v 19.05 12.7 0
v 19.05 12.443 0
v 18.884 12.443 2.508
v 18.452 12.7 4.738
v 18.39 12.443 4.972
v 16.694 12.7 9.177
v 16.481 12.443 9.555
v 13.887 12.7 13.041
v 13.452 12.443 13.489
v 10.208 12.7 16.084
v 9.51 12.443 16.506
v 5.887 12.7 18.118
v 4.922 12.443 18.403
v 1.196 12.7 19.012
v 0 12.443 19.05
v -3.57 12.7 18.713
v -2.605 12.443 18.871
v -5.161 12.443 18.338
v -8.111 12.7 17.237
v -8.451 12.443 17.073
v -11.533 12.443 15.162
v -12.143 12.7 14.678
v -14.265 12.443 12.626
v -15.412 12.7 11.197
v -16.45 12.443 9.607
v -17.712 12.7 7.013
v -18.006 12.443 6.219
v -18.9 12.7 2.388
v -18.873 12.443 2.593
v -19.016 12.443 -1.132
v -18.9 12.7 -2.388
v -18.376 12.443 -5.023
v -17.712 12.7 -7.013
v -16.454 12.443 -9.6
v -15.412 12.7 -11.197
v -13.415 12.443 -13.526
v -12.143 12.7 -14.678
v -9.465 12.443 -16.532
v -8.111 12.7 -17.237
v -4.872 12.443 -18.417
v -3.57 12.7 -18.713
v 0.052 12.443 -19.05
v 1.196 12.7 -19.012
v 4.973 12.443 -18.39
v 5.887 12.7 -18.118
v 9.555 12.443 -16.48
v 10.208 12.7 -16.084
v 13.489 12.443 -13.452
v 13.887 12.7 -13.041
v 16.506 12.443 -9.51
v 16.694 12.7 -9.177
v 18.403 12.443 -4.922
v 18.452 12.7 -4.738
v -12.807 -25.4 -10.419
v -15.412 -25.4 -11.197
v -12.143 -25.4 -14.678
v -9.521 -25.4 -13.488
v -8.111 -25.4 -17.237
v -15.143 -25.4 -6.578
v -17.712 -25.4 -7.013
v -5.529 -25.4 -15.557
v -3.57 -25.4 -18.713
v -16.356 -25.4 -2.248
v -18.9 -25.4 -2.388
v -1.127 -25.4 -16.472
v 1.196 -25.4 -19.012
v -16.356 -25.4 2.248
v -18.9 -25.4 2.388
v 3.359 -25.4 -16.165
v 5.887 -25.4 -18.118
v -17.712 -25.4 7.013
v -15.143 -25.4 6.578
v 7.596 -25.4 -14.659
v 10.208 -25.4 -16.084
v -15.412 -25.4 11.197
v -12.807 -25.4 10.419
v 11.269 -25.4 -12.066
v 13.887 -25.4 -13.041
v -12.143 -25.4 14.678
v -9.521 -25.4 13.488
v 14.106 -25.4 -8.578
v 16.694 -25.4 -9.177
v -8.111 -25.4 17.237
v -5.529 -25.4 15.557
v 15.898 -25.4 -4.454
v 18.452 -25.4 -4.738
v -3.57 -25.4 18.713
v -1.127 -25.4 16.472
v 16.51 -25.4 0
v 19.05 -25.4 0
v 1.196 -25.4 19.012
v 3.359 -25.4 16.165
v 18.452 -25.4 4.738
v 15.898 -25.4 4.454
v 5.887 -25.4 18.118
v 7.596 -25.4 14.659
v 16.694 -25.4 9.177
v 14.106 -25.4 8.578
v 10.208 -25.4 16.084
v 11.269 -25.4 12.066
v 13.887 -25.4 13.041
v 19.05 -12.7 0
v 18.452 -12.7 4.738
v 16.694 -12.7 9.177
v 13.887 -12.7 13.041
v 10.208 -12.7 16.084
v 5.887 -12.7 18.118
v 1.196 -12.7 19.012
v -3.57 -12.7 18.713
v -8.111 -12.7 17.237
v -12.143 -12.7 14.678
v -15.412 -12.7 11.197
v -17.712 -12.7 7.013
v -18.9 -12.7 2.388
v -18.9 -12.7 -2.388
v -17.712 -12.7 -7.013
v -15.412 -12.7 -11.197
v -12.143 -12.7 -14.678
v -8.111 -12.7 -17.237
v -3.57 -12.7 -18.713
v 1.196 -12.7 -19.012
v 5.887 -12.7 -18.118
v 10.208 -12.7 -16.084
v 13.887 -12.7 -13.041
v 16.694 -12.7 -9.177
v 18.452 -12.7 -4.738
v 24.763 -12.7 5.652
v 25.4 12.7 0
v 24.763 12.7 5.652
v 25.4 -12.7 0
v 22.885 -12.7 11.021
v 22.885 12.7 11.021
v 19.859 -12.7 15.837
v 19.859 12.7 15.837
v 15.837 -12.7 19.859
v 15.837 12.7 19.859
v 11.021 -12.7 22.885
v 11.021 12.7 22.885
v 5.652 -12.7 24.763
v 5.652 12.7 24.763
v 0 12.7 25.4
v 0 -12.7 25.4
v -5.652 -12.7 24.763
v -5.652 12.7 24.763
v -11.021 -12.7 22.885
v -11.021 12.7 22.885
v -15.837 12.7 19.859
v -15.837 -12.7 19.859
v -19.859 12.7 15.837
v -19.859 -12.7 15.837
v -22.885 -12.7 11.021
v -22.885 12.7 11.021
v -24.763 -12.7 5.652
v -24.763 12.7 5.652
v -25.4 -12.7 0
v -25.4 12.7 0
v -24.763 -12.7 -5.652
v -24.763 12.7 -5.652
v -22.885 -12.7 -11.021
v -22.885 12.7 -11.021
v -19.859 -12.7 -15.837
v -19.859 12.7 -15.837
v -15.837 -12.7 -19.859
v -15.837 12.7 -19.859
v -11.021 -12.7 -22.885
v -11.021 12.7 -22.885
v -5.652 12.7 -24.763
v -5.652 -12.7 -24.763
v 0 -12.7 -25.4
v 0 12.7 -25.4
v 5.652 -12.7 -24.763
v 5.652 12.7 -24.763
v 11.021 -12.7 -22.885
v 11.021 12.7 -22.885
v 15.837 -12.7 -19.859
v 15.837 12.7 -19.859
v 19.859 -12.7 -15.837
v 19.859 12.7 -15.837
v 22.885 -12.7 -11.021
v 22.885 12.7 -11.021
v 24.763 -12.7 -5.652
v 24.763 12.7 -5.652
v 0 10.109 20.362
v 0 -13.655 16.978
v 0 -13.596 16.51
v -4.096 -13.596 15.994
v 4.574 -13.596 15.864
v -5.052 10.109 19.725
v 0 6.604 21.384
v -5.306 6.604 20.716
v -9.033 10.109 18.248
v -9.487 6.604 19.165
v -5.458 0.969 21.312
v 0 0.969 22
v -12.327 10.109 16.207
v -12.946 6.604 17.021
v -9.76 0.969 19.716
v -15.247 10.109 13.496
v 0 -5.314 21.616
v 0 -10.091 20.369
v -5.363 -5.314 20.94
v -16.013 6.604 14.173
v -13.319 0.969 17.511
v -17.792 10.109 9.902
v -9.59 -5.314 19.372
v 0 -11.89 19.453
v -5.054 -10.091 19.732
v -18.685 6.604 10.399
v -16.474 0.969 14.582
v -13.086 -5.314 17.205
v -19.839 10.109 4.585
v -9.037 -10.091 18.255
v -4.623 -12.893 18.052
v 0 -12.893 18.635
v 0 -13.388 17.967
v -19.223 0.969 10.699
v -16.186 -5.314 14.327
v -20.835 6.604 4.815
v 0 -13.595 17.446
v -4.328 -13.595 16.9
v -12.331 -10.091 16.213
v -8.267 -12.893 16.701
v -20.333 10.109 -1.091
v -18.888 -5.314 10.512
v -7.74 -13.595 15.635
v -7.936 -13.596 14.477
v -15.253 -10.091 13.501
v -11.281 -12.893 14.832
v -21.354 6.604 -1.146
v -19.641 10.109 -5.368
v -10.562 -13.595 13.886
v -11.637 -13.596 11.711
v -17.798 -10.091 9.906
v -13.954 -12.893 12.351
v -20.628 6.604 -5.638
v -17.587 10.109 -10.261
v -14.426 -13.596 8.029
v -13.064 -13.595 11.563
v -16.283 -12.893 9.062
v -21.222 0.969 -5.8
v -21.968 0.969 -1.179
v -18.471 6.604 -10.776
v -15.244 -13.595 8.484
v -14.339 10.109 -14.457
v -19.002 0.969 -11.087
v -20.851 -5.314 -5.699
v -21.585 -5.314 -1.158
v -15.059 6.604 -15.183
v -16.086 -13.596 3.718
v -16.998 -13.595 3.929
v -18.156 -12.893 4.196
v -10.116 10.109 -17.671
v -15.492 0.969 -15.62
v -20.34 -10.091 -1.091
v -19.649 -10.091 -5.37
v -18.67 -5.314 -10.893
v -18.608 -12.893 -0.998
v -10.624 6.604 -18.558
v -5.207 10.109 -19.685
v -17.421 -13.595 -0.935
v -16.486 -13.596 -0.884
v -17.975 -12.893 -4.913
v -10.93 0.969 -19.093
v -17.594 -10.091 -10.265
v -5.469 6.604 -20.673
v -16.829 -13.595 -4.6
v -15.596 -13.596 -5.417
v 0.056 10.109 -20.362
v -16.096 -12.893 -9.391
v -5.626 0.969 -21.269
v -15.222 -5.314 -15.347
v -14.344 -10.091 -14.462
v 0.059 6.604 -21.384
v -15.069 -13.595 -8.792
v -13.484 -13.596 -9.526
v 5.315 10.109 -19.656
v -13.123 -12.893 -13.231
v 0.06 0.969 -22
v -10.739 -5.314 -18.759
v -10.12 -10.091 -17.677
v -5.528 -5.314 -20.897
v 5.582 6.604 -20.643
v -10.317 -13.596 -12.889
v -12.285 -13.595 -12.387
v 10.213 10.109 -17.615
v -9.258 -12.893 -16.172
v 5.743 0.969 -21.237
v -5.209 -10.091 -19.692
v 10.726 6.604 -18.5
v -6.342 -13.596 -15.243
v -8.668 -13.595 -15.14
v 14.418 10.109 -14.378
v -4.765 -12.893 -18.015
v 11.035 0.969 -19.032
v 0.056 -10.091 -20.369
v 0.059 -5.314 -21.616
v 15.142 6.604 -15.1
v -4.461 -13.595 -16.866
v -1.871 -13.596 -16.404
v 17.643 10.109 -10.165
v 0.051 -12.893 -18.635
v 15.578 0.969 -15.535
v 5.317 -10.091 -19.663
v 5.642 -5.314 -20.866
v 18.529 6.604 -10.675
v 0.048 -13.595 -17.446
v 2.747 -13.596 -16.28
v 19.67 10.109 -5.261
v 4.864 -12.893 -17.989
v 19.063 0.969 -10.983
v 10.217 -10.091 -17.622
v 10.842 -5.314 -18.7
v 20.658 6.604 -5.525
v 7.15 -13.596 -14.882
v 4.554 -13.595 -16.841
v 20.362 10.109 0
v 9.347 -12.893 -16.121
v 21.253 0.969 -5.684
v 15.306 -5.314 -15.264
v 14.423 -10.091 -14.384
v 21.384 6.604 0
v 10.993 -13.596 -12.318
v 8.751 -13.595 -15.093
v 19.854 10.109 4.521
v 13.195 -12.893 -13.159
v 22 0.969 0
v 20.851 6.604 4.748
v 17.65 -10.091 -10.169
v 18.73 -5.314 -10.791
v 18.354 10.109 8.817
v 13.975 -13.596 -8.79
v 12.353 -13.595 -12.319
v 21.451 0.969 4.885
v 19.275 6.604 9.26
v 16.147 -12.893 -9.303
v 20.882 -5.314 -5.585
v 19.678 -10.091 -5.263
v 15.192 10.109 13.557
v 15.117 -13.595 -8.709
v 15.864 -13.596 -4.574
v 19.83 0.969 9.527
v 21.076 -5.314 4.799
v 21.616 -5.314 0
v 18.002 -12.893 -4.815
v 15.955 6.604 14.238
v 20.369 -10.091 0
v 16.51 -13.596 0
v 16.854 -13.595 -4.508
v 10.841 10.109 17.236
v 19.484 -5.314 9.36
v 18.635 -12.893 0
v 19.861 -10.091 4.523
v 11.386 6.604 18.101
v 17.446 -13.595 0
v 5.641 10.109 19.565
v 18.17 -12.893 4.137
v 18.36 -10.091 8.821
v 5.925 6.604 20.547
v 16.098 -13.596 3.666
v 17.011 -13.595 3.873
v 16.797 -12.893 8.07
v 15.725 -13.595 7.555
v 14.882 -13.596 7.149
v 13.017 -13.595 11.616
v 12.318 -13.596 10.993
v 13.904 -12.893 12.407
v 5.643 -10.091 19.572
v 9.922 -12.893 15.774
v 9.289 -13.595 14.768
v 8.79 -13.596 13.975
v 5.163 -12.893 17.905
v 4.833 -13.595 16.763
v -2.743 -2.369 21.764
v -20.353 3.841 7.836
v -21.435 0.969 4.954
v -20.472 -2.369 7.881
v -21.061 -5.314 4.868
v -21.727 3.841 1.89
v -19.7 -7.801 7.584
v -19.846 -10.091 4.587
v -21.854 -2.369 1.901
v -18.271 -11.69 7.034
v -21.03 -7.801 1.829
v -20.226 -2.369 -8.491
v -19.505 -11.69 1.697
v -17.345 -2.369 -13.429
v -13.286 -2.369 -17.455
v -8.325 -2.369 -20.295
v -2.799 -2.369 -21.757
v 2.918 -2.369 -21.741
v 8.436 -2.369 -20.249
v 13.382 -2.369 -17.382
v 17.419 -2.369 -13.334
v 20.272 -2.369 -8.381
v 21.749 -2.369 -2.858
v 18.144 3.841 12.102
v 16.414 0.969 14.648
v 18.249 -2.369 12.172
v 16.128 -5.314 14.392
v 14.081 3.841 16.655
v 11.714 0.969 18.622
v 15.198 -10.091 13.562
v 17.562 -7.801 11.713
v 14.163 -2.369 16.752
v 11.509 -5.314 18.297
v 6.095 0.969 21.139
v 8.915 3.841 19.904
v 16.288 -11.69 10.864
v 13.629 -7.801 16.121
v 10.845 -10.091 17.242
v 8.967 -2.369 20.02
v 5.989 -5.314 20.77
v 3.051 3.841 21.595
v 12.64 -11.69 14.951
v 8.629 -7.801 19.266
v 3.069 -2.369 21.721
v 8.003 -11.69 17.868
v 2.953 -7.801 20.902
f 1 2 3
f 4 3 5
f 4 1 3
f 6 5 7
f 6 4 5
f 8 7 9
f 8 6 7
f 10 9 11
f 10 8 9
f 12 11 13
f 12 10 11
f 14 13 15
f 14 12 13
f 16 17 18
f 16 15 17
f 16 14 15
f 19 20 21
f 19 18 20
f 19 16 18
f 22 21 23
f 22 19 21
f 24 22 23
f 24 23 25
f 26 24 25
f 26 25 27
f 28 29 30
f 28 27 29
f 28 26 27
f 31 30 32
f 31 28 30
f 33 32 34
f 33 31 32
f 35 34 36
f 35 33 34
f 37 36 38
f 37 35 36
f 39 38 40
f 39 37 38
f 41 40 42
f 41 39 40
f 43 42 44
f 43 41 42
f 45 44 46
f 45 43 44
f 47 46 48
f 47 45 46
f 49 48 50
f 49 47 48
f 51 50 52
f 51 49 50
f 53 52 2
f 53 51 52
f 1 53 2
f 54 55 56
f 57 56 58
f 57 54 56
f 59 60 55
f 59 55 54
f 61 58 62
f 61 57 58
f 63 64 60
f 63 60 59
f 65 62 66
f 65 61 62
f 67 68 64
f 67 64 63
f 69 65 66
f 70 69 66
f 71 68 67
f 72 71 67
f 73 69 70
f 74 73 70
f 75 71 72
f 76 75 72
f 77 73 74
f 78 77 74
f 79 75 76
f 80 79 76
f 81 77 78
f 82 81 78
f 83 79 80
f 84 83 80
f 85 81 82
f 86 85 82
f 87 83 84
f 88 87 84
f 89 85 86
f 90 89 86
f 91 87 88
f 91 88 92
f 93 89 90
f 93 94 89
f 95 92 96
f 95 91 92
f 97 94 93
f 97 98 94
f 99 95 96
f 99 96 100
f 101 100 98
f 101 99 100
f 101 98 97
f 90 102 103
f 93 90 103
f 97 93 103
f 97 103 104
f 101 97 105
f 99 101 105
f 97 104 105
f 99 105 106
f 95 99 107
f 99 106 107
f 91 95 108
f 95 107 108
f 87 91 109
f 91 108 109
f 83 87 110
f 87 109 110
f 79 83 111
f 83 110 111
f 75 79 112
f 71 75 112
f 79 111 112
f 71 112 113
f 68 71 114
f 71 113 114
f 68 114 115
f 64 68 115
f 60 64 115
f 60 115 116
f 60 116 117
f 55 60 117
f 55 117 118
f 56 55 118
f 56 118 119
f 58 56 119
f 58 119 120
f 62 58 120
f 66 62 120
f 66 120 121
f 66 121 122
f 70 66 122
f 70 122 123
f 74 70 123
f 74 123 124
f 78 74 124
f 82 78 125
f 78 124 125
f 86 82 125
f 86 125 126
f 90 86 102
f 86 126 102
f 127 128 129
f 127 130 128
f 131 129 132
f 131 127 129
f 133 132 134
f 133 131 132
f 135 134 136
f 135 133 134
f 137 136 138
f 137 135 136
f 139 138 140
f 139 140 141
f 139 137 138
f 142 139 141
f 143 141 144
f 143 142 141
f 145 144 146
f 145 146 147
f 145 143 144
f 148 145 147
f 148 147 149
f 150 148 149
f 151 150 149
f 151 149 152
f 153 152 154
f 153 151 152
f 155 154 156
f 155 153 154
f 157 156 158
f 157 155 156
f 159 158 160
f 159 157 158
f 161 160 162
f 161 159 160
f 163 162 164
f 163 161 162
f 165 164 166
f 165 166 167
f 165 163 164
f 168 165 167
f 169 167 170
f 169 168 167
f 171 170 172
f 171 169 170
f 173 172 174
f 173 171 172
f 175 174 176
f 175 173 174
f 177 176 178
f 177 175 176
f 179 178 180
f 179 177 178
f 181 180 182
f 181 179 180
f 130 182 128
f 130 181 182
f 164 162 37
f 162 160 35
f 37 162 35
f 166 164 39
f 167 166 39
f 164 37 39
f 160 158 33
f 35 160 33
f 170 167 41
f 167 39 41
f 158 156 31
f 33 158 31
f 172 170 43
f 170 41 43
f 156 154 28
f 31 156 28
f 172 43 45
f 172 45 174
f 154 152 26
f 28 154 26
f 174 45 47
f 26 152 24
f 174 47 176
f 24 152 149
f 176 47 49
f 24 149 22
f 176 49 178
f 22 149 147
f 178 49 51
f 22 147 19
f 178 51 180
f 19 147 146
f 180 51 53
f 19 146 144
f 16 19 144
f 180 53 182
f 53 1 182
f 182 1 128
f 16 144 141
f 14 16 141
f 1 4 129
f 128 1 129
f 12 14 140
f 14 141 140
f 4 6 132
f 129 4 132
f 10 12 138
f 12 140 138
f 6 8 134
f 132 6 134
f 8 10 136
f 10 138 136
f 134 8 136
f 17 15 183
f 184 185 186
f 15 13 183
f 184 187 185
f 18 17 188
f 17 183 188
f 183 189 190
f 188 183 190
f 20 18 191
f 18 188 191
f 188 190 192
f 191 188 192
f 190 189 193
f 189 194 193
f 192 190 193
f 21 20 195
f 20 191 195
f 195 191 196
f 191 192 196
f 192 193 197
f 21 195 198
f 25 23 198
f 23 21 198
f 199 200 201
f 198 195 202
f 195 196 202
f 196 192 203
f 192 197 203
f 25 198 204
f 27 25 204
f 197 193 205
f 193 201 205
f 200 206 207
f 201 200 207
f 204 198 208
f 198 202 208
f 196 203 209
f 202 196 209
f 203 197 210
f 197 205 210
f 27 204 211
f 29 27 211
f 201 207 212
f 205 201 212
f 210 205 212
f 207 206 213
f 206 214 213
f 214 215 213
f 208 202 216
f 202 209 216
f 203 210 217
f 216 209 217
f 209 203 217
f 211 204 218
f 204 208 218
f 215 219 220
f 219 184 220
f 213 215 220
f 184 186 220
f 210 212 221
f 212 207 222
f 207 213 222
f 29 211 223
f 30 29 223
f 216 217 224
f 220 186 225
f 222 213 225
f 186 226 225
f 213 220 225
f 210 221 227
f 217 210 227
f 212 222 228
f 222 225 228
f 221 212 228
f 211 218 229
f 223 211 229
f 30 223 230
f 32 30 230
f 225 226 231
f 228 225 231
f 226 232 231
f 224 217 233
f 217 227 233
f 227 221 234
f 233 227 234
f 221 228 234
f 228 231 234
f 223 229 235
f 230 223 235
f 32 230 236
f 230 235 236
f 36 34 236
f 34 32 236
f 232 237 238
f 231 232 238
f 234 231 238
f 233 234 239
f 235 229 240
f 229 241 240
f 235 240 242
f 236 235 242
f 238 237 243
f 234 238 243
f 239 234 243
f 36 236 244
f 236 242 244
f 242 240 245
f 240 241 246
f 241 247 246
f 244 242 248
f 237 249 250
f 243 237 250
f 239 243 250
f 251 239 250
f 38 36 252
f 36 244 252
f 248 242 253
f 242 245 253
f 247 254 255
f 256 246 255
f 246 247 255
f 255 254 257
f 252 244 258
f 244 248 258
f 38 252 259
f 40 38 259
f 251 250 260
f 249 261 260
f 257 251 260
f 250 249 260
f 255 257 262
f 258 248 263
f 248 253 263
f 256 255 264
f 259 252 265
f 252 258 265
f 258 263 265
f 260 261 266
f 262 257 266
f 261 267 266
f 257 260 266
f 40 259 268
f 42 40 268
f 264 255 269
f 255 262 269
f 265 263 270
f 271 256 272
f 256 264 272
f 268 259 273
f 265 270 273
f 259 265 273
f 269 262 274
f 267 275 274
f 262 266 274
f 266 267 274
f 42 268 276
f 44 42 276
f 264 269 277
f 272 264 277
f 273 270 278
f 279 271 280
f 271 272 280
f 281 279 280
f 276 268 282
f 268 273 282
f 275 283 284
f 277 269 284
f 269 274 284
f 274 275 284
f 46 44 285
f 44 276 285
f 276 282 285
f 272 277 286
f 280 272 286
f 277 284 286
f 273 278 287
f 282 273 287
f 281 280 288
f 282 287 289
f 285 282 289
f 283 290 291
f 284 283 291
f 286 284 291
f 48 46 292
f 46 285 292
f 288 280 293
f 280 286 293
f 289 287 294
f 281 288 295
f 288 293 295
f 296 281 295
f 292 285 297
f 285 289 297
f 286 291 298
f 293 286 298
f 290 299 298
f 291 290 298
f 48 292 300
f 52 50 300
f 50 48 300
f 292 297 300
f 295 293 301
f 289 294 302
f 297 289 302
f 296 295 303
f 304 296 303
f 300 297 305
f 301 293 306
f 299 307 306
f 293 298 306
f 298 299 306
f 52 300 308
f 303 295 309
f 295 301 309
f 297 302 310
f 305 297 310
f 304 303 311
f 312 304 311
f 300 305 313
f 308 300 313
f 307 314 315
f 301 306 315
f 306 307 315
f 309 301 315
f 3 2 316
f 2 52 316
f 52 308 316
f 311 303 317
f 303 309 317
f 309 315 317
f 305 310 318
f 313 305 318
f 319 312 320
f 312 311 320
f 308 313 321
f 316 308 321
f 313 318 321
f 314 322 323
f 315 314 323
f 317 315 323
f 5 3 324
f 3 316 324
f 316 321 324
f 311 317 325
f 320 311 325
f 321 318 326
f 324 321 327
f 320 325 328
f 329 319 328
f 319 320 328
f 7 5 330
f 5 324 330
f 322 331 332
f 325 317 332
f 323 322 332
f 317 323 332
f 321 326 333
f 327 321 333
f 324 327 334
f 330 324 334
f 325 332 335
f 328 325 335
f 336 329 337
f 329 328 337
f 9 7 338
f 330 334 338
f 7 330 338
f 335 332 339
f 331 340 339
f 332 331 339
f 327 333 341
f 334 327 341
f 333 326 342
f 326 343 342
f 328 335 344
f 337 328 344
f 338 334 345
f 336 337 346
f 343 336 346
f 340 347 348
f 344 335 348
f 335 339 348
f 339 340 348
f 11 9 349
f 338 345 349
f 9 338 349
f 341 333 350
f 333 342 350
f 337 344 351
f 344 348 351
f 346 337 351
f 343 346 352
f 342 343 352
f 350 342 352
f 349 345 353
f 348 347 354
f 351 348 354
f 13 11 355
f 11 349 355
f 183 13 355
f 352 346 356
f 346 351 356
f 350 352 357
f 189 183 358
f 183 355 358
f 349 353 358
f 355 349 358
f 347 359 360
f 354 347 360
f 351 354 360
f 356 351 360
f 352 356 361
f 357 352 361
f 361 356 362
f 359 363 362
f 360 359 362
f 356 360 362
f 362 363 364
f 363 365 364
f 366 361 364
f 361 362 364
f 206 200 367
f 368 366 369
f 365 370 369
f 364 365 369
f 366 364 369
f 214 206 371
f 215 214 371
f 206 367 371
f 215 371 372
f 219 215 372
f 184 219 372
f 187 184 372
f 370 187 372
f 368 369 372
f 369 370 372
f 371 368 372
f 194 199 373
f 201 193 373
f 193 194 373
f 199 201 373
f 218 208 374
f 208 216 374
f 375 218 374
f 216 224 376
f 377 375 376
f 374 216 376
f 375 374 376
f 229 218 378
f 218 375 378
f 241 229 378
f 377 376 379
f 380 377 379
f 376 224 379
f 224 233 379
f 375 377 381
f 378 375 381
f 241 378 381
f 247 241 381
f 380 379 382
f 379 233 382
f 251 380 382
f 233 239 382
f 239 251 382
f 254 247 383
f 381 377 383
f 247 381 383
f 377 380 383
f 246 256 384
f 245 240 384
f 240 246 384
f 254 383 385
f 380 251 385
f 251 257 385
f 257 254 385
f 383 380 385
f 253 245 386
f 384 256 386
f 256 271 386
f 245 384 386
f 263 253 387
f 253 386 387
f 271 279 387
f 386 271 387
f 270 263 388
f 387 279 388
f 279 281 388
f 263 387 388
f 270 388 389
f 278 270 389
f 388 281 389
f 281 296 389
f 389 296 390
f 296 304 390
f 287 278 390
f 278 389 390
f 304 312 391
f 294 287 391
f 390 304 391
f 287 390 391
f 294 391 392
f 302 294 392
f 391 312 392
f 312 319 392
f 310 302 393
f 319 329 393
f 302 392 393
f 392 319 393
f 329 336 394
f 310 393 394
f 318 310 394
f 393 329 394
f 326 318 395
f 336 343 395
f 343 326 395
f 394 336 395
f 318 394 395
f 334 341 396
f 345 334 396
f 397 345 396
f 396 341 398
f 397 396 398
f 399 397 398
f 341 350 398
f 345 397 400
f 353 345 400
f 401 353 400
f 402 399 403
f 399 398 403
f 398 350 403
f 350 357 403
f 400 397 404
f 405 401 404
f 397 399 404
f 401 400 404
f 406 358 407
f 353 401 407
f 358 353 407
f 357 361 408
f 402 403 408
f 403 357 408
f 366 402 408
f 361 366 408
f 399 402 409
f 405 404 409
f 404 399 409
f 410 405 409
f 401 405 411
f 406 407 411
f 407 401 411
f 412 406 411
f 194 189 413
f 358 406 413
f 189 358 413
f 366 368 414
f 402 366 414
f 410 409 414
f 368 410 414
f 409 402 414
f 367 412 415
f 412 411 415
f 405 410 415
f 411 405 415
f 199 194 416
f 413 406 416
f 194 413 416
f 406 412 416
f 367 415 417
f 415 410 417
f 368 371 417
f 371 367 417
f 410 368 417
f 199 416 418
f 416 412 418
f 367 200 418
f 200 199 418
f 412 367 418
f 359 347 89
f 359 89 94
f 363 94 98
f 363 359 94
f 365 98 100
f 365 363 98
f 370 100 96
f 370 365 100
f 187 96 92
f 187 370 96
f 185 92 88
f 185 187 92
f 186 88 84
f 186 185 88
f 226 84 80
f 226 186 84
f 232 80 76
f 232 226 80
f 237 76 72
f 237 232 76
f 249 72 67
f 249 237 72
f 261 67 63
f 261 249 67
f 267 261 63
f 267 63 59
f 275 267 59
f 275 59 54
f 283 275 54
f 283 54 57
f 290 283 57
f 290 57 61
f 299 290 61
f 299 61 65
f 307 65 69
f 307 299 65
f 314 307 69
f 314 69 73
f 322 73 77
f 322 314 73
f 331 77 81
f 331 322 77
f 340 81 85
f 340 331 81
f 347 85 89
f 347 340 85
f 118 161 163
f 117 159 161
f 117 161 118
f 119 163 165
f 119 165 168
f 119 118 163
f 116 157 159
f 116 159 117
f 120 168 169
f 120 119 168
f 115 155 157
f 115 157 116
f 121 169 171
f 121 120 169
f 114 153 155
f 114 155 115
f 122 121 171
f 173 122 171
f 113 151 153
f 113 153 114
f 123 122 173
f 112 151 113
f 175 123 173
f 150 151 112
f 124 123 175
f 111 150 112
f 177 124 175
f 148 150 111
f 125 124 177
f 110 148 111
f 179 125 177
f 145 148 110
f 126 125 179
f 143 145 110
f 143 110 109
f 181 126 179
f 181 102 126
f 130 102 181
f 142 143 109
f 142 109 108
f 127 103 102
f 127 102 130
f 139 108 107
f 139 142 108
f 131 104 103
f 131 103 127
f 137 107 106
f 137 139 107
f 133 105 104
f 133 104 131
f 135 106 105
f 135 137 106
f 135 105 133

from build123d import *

# Parameters (mm, degrees)
F0_R     = 25.4
F0_R_2   = 19.05
F1_DEPTH = 12.7
F0_R_3   = 16.51
F2_DEPTH = 25.4


with BuildPart() as f1:
    # F0 (on Front) → F1 (new body, symmetric)
    with BuildSketch(Plane.XZ):
        Circle(F0_R)
        Circle(F0_R_2, mode=Mode.SUBTRACT)
    extrude(amount=F1_DEPTH, both=True)

    # F0 (on Front) → F2 (join)
    with BuildSketch(Plane.XZ):
        Circle(F0_R_2)
        Circle(F0_R_3, mode=Mode.SUBTRACT)
    extrude(amount=F2_DEPTH)

    # F3 (on Right) → F4 (revolve, cut)
    with BuildSketch(Plane.YZ):
        with BuildLine():
            add(Edge.make_bspline(
                [(13.654734008, 16.9758312404), (13.654734008, 25.7000523518), (-6.827367004, 21.3379417961), (-27.309468016, 16.9758312404), (-6.827367004, 12.6137206847), (13.654734008, 8.251610129), (13.654734008, 16.9758312404)],
                knots=[0, 0, 0, 2.0943951024, 2.0943951024, 4.1887902048, 4.1887902048, 6.2831853072, 6.2831853072, 6.2831853072], degree=2, weights=[1, 0.5, 1, 0.5, 1, 0.5, 1]))
        make_face()
    revolve(axis=Axis((0, 12.7, 0), (0, -1, 0)), mode=Mode.SUBTRACT)


solid = f1.part
